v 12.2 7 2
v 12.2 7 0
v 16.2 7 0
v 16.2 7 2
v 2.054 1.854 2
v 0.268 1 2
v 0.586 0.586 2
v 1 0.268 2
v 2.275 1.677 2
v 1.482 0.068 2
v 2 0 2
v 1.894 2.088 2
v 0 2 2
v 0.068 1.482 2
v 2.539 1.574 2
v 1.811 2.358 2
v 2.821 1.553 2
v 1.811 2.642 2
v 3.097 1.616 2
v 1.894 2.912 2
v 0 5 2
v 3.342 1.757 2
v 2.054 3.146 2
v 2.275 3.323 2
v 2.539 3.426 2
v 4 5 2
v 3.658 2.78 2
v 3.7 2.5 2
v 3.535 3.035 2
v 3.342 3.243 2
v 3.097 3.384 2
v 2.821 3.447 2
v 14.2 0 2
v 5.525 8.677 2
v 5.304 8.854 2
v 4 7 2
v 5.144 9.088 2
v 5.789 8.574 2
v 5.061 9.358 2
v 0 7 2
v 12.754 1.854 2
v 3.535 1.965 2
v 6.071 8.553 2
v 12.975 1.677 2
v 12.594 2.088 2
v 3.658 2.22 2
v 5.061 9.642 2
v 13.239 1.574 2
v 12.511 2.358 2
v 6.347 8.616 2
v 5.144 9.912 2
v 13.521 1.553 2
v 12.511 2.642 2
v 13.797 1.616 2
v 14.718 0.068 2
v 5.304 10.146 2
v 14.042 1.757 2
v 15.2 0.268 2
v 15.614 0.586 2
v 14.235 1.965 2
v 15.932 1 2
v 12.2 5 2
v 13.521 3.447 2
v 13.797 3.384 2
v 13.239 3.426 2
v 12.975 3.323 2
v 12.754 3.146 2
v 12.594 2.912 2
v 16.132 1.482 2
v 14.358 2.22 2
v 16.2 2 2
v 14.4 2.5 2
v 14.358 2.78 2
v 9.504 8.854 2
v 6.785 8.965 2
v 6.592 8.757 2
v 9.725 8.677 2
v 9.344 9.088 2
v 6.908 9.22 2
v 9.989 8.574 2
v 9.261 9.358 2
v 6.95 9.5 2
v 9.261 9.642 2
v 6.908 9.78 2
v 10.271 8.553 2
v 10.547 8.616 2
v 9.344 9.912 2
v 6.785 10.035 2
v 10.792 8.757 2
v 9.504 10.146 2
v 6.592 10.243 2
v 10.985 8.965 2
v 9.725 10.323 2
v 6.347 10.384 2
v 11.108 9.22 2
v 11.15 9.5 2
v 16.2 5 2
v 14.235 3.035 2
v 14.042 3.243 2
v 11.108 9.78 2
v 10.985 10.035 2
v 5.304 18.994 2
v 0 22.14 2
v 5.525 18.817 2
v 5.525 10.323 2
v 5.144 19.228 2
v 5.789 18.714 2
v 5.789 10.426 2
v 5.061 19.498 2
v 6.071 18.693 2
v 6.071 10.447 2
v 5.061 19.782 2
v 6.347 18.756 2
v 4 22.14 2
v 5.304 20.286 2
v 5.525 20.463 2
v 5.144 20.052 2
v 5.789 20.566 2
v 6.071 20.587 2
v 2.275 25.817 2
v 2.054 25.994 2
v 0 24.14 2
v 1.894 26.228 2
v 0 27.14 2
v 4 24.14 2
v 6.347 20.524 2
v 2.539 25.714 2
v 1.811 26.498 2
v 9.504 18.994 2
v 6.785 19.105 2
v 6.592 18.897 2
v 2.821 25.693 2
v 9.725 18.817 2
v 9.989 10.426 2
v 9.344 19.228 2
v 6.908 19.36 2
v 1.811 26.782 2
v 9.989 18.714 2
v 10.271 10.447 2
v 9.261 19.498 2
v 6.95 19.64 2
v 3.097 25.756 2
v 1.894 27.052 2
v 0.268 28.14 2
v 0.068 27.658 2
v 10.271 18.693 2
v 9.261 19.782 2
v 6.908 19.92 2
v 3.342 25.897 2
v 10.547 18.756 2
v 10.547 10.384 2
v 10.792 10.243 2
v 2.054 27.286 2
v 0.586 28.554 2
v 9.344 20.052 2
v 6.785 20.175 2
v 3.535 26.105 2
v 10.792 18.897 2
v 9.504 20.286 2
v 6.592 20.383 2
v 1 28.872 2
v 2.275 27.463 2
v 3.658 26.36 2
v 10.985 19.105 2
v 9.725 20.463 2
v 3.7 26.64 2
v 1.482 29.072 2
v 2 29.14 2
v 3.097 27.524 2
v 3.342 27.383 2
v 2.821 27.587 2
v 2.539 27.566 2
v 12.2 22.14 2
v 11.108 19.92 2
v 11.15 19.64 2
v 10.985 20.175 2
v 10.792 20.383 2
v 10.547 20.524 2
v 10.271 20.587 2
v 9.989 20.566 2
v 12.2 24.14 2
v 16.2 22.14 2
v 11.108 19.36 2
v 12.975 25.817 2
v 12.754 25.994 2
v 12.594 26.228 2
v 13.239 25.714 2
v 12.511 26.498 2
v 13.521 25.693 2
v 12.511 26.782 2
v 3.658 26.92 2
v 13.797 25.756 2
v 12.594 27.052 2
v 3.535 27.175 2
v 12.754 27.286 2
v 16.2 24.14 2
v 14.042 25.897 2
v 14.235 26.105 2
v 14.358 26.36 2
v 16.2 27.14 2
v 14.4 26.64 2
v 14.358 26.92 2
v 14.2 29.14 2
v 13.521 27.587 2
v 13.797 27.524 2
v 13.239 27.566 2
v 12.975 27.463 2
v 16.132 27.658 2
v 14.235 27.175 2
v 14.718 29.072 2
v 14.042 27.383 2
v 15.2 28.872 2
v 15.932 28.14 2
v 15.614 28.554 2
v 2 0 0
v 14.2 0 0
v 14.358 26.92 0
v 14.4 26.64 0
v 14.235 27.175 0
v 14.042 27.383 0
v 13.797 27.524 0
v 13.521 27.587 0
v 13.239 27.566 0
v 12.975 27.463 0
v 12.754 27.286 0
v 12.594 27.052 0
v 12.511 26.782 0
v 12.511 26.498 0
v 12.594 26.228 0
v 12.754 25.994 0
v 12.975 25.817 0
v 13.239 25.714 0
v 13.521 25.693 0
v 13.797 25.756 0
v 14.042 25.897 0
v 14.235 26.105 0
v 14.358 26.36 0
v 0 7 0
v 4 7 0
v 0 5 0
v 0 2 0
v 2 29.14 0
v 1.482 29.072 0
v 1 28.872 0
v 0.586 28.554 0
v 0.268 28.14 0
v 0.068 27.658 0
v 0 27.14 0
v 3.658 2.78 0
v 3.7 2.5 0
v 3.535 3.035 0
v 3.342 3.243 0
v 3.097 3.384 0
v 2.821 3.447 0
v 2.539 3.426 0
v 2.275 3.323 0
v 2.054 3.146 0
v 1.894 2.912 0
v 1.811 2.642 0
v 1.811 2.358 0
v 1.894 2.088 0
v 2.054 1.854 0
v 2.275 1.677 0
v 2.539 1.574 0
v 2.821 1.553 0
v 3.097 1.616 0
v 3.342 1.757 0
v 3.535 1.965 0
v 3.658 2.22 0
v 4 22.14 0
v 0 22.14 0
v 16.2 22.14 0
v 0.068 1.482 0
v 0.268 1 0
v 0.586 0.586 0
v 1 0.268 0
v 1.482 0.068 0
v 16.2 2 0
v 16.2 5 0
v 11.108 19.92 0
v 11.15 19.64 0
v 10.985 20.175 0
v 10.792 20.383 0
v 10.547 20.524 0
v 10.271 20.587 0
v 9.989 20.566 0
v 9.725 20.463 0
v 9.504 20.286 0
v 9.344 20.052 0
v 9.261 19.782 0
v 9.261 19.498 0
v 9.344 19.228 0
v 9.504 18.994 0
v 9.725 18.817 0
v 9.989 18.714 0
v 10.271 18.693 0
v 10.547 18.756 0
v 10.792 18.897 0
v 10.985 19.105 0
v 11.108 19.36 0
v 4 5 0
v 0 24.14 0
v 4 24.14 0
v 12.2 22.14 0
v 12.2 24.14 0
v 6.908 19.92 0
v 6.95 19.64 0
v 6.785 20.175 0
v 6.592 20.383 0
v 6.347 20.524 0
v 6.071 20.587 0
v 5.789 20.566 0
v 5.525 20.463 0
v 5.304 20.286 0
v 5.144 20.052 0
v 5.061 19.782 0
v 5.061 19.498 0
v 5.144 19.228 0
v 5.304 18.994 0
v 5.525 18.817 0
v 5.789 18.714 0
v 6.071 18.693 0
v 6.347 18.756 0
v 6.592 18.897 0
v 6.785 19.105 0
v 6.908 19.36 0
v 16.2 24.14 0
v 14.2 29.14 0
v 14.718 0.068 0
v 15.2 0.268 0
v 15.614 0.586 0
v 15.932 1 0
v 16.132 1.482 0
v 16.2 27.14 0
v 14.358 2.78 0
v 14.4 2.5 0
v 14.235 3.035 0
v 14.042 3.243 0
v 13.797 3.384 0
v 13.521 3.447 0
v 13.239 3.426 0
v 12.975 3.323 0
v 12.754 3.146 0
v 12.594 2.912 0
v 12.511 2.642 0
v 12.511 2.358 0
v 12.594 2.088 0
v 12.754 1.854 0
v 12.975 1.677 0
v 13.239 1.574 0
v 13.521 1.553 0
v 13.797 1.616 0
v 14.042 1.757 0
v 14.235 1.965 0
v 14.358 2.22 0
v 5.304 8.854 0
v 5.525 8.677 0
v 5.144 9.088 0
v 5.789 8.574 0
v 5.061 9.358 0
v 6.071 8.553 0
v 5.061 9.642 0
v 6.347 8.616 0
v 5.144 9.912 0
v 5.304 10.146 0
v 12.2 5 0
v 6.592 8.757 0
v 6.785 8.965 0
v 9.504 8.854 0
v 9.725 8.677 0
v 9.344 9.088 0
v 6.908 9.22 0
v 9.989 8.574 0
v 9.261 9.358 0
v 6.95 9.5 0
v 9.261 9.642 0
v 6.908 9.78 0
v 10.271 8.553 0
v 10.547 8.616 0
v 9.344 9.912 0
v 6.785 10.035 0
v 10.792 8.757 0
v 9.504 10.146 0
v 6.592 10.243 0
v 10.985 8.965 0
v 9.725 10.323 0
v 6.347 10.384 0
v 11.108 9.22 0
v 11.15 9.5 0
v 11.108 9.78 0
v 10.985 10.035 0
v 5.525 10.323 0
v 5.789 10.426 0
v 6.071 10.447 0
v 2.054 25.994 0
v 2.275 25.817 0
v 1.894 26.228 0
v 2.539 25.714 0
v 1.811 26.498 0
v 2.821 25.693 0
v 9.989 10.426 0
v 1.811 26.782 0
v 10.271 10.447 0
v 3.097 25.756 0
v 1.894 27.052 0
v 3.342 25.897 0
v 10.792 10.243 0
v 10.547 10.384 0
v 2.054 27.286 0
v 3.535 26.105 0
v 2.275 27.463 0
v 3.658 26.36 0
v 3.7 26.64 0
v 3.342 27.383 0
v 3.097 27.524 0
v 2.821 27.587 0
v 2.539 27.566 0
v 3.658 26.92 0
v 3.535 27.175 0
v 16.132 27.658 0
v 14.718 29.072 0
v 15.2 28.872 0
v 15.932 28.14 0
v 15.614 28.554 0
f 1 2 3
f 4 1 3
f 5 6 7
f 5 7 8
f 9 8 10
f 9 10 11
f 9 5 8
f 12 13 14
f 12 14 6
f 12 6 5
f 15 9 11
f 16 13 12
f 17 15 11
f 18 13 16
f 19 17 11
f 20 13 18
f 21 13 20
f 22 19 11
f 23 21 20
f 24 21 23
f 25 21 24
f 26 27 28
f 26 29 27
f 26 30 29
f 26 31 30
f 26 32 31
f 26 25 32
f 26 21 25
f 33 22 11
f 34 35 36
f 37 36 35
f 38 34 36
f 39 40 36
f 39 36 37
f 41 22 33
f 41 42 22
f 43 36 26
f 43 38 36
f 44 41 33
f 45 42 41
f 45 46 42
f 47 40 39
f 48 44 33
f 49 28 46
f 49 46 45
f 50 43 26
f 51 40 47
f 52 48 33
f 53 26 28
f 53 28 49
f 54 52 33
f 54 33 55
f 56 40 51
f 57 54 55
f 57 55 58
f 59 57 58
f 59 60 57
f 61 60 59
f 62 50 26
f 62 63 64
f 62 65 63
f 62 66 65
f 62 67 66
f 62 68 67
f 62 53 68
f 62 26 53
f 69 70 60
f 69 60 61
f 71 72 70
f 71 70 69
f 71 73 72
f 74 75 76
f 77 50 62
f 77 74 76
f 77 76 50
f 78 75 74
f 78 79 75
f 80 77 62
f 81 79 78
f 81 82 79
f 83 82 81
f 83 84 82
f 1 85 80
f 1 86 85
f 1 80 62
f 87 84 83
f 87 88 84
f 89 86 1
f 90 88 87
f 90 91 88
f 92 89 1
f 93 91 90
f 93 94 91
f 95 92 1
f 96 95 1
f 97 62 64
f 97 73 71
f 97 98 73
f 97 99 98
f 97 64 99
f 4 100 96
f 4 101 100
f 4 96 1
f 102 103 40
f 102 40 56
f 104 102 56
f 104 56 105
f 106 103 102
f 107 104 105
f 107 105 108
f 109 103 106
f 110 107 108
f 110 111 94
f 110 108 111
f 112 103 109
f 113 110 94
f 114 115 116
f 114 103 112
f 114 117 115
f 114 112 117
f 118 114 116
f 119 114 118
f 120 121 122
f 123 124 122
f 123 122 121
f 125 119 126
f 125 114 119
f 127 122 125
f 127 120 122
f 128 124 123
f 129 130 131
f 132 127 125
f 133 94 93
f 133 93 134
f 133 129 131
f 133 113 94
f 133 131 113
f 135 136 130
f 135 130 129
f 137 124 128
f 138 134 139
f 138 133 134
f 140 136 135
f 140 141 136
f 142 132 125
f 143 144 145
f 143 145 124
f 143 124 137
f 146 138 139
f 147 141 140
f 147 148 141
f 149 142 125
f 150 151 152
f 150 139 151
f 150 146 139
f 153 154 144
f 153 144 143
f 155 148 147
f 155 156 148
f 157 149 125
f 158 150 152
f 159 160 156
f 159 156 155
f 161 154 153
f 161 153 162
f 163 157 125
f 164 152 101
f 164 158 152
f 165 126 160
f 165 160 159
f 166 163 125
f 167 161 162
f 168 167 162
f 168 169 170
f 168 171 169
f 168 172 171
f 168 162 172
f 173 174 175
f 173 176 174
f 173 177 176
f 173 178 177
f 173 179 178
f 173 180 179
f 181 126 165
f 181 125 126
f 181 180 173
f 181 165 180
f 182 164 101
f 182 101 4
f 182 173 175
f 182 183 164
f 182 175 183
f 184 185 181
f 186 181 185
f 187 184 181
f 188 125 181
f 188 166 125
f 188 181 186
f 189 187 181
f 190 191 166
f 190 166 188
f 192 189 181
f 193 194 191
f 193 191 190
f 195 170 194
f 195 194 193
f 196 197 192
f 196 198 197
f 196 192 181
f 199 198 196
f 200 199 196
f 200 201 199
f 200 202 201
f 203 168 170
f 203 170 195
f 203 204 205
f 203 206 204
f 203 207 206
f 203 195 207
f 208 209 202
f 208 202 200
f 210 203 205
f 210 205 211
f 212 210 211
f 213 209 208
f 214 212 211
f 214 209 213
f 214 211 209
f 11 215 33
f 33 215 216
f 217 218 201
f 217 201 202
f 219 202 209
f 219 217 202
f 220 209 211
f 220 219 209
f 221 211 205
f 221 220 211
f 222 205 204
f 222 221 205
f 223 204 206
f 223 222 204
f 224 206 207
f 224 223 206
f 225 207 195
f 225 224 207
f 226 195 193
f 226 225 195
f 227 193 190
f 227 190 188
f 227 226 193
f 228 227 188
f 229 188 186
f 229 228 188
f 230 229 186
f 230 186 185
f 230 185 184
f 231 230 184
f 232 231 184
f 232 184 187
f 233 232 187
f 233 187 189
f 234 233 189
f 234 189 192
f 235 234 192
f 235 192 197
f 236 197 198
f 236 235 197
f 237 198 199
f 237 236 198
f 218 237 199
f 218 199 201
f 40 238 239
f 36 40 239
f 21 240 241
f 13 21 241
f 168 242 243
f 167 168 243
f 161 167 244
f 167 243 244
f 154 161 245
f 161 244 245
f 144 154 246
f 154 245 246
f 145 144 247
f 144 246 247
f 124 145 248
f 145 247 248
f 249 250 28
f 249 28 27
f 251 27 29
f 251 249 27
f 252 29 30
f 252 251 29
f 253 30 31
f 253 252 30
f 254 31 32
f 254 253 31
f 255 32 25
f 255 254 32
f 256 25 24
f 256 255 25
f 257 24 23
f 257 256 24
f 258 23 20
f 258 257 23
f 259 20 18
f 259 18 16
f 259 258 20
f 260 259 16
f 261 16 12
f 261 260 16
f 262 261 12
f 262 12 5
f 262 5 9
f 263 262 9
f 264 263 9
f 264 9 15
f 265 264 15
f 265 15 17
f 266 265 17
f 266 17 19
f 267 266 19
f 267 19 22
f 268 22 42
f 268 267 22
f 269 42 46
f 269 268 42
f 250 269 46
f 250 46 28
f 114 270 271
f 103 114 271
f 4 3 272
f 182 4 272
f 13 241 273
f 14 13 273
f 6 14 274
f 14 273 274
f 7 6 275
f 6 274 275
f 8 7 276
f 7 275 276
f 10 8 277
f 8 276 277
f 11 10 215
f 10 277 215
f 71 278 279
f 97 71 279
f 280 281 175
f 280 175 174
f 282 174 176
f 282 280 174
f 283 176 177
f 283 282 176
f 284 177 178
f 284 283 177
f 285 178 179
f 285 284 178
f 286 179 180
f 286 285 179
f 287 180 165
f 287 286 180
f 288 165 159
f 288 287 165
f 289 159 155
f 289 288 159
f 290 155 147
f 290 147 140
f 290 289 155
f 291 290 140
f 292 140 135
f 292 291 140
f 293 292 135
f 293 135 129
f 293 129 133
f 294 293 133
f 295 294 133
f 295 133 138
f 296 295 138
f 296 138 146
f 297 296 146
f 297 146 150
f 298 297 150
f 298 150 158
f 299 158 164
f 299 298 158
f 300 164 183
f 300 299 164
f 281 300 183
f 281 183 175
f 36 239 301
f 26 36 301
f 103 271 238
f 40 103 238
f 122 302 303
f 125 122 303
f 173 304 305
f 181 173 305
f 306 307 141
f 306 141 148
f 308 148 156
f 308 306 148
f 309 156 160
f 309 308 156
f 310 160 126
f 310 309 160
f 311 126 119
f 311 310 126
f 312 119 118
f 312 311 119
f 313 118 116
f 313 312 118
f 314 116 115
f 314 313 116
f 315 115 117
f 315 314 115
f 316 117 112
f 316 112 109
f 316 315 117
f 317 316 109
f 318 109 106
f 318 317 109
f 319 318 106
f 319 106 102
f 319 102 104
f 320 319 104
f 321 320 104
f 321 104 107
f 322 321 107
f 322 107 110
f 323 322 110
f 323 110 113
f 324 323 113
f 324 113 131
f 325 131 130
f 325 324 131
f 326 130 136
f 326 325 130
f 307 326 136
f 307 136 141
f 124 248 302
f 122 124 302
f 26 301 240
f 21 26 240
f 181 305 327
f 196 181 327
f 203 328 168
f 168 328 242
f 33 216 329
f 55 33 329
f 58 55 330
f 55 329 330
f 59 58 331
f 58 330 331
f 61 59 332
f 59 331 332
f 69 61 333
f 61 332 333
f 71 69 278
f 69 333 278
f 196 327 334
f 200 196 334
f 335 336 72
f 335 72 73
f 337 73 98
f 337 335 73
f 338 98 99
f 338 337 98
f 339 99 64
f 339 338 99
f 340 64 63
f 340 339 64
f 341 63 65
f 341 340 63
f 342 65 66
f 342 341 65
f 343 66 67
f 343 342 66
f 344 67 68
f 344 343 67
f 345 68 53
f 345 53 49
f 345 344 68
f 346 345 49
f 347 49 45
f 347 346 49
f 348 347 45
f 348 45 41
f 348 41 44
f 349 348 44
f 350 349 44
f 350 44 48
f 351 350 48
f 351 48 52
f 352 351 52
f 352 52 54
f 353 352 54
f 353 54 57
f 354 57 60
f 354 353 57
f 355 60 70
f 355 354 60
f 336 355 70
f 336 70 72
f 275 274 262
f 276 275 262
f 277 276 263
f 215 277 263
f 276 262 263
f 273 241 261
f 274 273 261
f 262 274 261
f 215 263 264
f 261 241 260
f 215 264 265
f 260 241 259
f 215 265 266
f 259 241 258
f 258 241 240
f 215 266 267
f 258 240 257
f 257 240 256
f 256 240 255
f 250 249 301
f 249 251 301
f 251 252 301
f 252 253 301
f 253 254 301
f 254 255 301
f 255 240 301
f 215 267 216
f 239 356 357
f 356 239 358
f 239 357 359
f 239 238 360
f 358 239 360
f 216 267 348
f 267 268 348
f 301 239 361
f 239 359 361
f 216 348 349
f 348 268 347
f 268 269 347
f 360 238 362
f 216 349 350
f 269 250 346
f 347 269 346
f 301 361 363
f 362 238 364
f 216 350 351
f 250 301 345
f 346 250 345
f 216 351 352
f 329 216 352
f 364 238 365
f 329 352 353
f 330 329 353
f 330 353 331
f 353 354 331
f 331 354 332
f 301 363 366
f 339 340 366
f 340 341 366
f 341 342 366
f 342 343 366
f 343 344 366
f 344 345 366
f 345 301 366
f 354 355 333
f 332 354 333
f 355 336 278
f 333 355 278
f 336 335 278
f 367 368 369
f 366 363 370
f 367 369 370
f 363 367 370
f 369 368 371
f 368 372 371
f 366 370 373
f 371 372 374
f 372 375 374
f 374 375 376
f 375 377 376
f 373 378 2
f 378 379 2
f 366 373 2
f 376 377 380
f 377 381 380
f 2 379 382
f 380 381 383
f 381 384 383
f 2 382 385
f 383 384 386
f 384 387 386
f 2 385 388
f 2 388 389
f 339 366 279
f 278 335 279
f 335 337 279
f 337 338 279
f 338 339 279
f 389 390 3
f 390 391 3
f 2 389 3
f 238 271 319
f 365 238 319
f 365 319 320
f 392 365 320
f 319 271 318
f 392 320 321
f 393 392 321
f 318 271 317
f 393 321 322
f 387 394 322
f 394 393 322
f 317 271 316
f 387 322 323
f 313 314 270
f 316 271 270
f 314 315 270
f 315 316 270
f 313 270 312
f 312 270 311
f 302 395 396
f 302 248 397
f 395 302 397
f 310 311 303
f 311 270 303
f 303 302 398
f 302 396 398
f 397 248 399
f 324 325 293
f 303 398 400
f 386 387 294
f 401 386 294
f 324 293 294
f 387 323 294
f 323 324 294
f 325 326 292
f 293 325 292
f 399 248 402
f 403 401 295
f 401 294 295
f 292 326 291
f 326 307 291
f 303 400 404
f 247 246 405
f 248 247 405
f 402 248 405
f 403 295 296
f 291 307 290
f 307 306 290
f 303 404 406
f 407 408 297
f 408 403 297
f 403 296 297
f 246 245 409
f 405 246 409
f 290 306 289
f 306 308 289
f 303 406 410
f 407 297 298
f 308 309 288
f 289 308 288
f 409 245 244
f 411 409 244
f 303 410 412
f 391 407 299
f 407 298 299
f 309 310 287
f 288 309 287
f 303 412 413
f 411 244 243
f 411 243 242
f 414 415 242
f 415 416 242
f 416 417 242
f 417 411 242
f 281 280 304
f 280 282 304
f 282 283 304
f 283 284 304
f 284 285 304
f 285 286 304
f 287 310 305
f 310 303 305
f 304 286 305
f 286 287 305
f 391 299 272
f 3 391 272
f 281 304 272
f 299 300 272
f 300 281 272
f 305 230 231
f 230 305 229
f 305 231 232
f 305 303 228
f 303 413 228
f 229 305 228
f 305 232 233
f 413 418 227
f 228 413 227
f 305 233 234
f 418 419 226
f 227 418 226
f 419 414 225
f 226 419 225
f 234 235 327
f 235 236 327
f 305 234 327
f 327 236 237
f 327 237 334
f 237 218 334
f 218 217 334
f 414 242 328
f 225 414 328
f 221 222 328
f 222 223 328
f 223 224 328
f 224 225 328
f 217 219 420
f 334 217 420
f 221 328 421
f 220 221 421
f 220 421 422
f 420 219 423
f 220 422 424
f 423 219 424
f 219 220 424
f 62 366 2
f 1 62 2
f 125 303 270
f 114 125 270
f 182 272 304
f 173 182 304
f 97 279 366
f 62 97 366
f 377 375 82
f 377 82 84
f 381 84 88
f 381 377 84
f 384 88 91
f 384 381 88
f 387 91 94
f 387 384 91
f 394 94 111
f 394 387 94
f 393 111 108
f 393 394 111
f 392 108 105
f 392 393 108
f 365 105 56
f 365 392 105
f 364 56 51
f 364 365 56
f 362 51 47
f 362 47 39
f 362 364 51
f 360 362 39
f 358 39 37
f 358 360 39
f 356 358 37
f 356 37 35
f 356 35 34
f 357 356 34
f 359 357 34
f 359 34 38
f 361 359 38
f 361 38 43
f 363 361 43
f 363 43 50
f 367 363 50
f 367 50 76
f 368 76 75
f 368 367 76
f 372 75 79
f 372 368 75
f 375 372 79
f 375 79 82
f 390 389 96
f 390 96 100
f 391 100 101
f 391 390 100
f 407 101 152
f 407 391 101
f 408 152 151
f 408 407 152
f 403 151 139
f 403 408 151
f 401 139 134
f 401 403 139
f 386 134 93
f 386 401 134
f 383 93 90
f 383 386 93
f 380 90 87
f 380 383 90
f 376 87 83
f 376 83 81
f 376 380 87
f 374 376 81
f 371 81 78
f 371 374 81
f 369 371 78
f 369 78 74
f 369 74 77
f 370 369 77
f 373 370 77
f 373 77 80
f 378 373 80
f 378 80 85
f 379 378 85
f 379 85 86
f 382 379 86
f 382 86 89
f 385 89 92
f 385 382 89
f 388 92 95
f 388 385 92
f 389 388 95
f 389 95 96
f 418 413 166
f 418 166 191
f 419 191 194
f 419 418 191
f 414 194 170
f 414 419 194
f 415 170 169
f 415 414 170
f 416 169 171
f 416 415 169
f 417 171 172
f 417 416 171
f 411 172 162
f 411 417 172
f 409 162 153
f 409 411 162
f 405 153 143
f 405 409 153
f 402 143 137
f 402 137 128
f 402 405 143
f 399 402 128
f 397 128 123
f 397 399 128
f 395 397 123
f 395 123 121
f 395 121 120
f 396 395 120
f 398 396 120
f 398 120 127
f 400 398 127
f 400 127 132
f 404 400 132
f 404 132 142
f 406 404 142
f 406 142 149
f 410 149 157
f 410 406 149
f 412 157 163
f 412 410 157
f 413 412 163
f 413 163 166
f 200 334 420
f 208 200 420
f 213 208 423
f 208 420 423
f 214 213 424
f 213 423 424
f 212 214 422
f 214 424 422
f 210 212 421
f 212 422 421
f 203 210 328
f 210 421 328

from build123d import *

# Parameters (mm, degrees)
SKETCH1_R           = 0.95
BOSS_EXTRUDE1_DEPTH = 2


with BuildPart() as part:
    # Sketch1 → Boss-Extrude1 (new body)
    with BuildSketch(Plane.XY):
        with BuildLine():
            Line((0, 22.14), (0, 7))
            Line((0, 7), (4, 7))
            Line((4, 7), (4, 5))
            Line((4, 5), (0, 5))
            Line((0, 5), (0, 2))
            ThreePointArc((0, 2), (0.585786438, 0.585786438), (2, 0))
            Line((2, 0), (14.2, 0))
            ThreePointArc((14.2, 0), (15.614213562, 0.585786438), (16.2, 2))
            Line((16.2, 2), (16.2, 5))
            Line((16.2, 5), (12.2, 5))
            Line((12.2, 5), (12.2, 7))
            Line((12.2, 7), (16.2, 7))
            Line((16.2, 7), (16.2, 22.14))
            Line((16.2, 22.14), (12.2, 22.14))
            Line((12.2, 22.14), (12.2, 24.14))
            Line((12.2, 24.14), (16.2, 24.14))
            Line((16.2, 24.14), (16.2, 27.14))
            ThreePointArc((16.2, 27.14), (15.614213562, 28.554213562), (14.2, 29.14))
            Line((14.2, 29.14), (2, 29.14))
            ThreePointArc((2, 29.14), (0.585786438, 28.554213562), (0, 27.14))
            Line((0, 27.14), (0, 24.14))
            Line((0, 24.14), (4, 24.14))
            Line((4, 24.14), (4, 22.14))
            Line((4, 22.14), (0, 22.14))
        make_face()
        with Locations((13.45, 2.5)):
            Circle(SKETCH1_R, mode=Mode.SUBTRACT)
        with Locations((10.2, 9.5)):
            Circle(SKETCH1_R, mode=Mode.SUBTRACT)
        with Locations((2.75, 26.64)):
            Circle(SKETCH1_R, mode=Mode.SUBTRACT)
        with Locations((6, 19.64)):
            Circle(SKETCH1_R, mode=Mode.SUBTRACT)
        with Locations((6, 9.5)):
            Circle(SKETCH1_R, mode=Mode.SUBTRACT)
        with Locations((2.75, 2.5)):
            Circle(SKETCH1_R, mode=Mode.SUBTRACT)
        with Locations((10.2, 19.64)):
            Circle(SKETCH1_R, mode=Mode.SUBTRACT)
        with Locations((13.45, 26.64)):
            Circle(SKETCH1_R, mode=Mode.SUBTRACT)
    extrude(amount=BOSS_EXTRUDE1_DEPTH)


solid = part.part
